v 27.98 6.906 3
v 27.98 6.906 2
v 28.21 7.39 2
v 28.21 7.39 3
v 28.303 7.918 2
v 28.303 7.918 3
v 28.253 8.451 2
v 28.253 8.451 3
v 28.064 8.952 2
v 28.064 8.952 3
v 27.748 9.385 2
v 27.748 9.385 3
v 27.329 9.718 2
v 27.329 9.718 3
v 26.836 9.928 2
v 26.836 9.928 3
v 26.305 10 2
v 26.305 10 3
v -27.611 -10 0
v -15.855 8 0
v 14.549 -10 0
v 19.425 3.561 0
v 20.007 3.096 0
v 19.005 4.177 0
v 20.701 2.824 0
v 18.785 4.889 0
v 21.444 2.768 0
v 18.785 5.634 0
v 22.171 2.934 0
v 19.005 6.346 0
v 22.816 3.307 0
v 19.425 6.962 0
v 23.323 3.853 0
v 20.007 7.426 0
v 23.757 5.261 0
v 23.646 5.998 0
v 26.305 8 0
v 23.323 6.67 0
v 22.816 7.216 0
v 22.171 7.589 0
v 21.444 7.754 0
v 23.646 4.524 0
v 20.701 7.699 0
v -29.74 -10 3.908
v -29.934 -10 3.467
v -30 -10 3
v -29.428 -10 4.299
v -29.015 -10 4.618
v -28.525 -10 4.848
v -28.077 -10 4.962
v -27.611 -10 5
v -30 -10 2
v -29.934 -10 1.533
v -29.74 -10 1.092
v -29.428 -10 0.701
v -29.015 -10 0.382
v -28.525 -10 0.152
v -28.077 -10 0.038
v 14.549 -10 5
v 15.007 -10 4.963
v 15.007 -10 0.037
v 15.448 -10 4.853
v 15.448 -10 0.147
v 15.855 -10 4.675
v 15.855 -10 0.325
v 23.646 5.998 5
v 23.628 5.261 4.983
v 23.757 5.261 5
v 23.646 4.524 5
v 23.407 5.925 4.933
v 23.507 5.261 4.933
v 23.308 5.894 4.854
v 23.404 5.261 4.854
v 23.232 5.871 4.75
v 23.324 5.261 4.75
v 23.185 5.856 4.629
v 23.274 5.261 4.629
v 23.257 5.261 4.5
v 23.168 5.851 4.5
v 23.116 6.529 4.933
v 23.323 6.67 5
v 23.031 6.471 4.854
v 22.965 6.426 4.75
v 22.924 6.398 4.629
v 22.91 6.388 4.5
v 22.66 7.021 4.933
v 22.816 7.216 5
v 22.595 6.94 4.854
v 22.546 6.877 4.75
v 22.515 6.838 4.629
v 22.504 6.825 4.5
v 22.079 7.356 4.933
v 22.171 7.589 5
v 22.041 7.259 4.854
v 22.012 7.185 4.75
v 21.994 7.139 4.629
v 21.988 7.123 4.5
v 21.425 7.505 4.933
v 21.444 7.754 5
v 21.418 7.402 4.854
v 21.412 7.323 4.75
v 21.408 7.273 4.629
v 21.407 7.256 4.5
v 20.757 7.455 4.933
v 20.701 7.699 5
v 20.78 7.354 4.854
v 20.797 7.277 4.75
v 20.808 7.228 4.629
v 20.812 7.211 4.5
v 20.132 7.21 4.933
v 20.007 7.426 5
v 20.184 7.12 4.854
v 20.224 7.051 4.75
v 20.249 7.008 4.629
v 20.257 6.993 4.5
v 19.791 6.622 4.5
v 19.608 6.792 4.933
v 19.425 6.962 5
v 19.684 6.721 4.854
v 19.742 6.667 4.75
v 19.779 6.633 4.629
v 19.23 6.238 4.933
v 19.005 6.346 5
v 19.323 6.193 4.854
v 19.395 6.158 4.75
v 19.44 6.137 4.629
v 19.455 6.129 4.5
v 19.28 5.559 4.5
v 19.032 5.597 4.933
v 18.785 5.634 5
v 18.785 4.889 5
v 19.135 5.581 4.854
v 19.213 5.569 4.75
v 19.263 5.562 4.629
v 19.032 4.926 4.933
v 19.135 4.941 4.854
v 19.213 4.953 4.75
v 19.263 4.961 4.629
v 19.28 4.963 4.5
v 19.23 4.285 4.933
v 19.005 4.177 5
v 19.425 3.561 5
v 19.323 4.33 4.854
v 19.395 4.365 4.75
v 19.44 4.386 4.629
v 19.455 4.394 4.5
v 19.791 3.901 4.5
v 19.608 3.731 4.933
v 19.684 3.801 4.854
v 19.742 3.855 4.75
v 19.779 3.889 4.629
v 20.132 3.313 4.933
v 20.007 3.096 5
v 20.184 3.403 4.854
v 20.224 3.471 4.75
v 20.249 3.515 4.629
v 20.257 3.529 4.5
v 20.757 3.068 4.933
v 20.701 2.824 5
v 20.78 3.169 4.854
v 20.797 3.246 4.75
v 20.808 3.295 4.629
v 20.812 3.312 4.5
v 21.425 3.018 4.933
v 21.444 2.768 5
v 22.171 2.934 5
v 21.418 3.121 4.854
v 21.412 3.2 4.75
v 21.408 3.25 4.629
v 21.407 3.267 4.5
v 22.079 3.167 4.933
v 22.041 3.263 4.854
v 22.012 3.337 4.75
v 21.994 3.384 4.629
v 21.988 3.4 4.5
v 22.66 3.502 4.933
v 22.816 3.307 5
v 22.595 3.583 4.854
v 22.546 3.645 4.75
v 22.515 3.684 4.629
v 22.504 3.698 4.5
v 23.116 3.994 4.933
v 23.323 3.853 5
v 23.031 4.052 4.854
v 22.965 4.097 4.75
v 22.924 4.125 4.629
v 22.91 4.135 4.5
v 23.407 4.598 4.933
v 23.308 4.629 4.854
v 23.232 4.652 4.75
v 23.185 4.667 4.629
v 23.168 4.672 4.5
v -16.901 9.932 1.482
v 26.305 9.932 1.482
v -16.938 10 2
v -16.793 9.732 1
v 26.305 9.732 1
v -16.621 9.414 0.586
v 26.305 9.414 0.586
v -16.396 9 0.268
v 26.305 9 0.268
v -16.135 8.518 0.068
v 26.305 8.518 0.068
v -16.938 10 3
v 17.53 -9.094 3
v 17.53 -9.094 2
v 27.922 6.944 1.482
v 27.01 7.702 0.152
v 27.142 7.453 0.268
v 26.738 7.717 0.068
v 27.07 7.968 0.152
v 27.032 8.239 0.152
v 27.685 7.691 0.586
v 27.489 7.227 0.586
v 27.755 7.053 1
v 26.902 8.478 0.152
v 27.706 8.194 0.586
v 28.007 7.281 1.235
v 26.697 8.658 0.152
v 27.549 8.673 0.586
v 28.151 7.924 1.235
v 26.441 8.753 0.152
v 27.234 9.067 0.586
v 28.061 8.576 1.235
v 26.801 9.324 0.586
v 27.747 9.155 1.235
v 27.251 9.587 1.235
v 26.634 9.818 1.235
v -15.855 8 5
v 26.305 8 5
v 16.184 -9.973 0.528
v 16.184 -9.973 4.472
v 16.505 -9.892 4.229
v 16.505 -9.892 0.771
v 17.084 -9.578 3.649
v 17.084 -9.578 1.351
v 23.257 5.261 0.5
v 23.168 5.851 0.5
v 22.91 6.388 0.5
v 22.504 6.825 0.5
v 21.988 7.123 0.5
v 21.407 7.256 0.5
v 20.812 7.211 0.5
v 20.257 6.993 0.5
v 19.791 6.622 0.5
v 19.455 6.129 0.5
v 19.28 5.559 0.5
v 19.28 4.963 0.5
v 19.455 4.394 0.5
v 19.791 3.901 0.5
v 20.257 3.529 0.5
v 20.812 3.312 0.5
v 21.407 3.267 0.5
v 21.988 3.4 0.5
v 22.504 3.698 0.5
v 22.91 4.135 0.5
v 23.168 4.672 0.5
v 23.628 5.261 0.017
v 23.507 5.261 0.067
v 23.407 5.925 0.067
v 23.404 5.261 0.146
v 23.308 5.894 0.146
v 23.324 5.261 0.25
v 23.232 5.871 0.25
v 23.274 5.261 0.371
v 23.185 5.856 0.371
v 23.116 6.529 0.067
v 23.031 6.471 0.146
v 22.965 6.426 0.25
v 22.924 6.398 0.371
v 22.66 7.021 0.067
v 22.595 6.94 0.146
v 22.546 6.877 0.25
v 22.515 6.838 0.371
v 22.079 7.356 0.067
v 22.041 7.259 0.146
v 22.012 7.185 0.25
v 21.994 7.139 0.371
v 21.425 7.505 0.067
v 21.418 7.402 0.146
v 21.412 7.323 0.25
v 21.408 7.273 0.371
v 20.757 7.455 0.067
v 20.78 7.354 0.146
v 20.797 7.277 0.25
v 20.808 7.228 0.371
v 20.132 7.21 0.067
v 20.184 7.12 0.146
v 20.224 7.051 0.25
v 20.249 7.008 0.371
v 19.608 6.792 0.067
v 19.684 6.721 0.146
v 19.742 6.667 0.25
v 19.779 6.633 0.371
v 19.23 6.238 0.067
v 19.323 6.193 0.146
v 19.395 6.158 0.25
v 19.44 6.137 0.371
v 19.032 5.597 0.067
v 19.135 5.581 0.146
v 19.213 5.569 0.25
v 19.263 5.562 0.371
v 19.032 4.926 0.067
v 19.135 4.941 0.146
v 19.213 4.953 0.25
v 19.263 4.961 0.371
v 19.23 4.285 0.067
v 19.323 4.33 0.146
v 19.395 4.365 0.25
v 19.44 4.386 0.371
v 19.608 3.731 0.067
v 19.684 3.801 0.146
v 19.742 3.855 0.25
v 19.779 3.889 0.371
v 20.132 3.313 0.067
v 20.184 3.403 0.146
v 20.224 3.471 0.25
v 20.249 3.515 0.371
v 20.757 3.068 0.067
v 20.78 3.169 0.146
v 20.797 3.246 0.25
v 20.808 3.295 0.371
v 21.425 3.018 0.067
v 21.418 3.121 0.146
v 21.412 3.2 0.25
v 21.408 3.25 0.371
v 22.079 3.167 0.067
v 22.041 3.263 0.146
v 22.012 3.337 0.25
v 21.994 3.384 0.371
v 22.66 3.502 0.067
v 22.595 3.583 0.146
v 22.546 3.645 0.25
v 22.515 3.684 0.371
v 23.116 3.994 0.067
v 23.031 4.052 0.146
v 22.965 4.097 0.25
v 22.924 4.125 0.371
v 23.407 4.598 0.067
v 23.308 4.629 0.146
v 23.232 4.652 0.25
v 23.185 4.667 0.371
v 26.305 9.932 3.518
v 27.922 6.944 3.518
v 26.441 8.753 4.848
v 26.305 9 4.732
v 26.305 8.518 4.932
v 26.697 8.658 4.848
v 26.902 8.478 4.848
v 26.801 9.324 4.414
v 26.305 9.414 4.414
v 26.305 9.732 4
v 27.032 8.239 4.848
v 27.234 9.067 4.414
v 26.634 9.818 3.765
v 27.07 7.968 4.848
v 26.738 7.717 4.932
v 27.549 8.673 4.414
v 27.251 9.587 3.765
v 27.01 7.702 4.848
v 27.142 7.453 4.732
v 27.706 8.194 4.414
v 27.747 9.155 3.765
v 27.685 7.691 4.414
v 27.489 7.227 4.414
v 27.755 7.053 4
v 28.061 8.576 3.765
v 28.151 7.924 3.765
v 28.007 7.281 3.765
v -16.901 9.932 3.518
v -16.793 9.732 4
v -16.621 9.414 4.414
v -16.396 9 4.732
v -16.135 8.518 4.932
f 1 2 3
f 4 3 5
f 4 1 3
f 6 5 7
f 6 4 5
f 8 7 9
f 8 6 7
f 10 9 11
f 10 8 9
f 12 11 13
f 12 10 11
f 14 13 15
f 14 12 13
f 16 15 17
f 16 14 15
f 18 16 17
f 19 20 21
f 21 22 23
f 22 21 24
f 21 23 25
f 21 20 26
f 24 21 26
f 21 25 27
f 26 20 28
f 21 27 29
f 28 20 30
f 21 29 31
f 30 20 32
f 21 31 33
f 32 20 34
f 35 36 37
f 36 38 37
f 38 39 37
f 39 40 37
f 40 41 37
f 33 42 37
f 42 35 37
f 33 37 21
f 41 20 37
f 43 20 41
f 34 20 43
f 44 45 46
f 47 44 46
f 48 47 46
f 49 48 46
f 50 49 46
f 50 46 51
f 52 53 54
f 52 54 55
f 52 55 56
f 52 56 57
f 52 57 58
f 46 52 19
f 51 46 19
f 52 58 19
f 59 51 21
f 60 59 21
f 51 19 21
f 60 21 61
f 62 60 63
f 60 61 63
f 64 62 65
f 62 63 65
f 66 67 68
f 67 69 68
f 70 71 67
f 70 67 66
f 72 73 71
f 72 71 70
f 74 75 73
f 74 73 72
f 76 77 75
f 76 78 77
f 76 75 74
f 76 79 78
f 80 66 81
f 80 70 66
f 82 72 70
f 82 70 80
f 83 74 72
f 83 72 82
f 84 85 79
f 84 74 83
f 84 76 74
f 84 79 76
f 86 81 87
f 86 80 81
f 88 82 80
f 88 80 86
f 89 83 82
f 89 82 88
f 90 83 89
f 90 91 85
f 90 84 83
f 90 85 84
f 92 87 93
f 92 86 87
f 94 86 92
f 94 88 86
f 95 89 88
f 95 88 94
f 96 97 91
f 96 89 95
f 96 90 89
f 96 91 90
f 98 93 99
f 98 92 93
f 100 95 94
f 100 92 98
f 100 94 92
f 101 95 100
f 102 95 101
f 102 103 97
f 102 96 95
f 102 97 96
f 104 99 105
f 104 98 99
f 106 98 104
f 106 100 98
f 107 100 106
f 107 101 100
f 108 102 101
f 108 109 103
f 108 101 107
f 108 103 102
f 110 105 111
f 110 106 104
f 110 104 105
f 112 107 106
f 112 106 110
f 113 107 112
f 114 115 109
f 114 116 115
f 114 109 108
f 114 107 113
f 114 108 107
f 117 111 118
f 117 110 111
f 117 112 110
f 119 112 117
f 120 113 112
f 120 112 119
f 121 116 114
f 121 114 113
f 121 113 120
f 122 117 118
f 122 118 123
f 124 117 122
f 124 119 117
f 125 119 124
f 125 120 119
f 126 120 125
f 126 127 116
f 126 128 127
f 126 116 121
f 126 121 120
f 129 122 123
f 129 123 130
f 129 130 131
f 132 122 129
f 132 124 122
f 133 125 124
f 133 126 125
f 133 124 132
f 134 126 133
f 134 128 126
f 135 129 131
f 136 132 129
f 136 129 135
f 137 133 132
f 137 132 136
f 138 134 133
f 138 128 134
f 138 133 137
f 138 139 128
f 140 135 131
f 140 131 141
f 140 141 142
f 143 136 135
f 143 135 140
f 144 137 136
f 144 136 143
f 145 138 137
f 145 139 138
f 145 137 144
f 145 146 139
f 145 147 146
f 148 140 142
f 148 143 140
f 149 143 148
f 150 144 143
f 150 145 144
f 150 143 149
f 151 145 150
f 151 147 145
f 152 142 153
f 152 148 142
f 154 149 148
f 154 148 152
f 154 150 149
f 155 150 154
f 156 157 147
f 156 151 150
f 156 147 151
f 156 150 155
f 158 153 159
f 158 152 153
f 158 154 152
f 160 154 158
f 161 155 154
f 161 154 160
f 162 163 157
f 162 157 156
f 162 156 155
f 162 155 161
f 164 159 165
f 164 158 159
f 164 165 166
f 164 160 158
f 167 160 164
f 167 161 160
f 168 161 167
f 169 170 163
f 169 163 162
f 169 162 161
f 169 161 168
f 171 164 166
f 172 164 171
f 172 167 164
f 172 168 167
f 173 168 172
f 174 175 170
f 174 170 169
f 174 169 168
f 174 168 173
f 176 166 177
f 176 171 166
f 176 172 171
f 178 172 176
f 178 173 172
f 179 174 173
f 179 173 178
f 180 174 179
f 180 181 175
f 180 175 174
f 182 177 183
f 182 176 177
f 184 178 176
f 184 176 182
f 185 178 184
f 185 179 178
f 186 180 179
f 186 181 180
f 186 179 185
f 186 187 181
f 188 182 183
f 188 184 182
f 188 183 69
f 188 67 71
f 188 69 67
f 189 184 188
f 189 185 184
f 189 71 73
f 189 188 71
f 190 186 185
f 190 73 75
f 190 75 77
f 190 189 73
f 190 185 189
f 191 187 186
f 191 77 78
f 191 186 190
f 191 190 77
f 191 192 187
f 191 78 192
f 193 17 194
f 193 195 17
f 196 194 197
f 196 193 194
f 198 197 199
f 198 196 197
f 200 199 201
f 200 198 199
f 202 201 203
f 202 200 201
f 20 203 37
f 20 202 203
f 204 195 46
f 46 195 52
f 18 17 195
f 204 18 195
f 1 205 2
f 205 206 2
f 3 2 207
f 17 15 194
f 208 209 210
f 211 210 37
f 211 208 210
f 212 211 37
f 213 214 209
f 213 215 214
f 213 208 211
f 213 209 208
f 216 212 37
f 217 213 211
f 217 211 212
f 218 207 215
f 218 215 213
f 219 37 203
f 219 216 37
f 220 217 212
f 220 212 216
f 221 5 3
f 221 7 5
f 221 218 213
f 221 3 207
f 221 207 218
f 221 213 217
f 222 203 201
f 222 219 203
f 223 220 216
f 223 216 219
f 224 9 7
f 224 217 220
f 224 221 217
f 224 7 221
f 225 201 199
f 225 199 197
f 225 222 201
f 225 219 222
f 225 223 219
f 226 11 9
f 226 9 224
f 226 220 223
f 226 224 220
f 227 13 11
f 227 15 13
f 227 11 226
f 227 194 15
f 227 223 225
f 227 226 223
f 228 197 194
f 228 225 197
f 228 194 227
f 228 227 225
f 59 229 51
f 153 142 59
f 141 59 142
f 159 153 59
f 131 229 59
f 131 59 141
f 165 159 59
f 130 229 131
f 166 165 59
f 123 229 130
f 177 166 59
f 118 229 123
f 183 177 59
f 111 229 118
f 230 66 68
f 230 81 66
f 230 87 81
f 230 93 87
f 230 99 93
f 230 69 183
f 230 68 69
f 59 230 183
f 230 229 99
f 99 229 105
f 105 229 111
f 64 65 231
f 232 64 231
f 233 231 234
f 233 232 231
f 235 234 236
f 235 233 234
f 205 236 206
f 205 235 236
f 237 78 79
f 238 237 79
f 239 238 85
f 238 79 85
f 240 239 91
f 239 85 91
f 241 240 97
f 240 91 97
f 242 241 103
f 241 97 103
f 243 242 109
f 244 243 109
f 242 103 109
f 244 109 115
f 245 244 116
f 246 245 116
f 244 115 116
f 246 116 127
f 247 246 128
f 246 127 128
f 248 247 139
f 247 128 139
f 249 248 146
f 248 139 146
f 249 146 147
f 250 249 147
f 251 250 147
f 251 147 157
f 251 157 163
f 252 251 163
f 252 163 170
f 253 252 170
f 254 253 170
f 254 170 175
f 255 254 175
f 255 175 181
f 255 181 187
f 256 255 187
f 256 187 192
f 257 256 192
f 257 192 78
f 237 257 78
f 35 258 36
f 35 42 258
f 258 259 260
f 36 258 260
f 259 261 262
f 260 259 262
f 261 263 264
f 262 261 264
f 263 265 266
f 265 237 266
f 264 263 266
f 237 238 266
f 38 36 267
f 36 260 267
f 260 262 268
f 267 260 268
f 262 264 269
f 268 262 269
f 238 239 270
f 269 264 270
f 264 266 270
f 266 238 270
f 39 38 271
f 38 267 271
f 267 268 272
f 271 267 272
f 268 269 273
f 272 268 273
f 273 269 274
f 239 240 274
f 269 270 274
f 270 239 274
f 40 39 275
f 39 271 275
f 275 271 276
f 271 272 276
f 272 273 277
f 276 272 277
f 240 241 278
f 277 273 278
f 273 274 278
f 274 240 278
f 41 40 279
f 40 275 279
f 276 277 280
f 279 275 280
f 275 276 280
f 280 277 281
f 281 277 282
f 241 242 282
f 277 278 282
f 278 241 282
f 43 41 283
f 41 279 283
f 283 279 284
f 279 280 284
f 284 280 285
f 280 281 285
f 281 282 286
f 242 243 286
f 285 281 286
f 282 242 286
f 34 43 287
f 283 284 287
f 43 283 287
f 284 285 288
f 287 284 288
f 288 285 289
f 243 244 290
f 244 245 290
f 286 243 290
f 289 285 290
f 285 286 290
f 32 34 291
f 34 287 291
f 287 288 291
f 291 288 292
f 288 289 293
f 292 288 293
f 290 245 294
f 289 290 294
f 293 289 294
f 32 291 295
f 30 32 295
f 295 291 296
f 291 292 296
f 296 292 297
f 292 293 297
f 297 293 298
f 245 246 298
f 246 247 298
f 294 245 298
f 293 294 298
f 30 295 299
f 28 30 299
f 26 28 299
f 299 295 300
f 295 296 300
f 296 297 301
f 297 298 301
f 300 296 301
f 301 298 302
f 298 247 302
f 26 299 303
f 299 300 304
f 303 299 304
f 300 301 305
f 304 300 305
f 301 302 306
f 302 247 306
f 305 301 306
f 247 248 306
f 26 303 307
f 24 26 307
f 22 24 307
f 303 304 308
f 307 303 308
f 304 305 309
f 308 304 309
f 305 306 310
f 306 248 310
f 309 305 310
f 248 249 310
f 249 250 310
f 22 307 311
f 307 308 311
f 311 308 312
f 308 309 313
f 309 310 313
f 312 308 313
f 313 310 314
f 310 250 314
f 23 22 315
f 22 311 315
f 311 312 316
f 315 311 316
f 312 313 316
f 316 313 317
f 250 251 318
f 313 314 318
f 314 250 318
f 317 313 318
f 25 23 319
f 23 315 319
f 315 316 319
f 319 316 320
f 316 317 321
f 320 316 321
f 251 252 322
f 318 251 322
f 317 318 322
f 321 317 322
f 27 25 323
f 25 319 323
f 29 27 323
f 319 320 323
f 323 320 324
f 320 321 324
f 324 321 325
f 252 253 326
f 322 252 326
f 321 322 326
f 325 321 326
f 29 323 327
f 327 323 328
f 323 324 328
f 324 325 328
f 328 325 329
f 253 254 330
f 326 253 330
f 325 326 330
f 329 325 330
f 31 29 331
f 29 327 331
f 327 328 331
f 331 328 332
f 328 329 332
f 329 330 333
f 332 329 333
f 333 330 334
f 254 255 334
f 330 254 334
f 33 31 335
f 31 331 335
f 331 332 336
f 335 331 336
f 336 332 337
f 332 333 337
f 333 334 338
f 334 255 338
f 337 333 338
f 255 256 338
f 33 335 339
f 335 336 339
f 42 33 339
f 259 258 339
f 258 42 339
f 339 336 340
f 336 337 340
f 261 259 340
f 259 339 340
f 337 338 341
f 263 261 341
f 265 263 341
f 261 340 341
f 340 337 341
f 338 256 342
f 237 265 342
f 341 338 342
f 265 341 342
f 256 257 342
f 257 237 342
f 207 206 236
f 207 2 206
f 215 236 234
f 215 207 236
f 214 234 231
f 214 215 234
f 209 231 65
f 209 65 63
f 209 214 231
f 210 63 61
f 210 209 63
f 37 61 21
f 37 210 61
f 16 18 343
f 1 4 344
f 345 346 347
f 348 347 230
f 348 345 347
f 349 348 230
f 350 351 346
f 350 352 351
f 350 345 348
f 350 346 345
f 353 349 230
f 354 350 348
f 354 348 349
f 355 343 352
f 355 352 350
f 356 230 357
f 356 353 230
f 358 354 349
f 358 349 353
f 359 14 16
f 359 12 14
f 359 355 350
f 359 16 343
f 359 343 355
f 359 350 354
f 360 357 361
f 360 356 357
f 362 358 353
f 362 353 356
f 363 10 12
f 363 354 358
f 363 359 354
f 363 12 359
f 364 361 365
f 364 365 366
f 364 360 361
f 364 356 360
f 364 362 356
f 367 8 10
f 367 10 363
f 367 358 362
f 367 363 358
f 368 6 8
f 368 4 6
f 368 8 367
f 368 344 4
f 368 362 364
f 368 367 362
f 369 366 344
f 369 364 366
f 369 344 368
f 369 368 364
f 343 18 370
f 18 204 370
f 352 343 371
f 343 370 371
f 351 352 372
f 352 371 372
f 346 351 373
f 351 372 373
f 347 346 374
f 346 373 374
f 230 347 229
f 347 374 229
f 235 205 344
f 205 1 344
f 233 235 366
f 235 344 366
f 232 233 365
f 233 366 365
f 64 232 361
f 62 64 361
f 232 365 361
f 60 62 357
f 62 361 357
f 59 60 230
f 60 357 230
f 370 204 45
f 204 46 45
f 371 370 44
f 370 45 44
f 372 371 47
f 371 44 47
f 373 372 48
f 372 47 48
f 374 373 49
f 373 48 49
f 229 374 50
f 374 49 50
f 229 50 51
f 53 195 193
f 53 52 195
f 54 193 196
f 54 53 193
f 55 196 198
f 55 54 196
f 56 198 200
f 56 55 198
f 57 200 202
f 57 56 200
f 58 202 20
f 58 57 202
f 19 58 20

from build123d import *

# Parameters (mm, degrees)
F1_DEPTH = 5
F2_R     = 2
F3_R     = 2
F4_DEPTH = 25.4
F5_R     = 0.5


with BuildPart() as f1:
    # F0 (on Top) → F1 (new body)
    with BuildSketch(Plane.XY):
        Polygon((-30, -10), (16.9377624965, -10), (30, 10), (-16.9377624965, 10), align=None)
    extrude(amount=F1_DEPTH)

    # F2
    f2_edges = [f1.edges().sort_by_distance(p)[0] for p in [
        (6.531119, 10, 5),
        (-23.468881, 0, 5),
        (23.468881, 0, 5),
        (16.937762, -10, 2.5),
        (30, 10, 2.5),
        (23.468881, 0, 0),
        (6.531119, 10, 0),
        (-23.468881, 0, 0),
    ]]
    fillet(f2_edges, radius=F2_R)

    # F3 (on face) → F4 (cut)
    with BuildSketch(Plane.XY.offset(5)):
        with Locations((21.2572028662, 5.2613858901)):
            Circle(F3_R)
    extrude(amount=-F4_DEPTH, mode=Mode.SUBTRACT)

    # F5
    f5_edges = [f1.edges().sort_by_distance(p)[0] for p in [
        (19.257203, 5.261386, 5),
        (19.257203, 5.261386, 0),
    ]]
    fillet(f5_edges, radius=F5_R)


solid = f1.part
